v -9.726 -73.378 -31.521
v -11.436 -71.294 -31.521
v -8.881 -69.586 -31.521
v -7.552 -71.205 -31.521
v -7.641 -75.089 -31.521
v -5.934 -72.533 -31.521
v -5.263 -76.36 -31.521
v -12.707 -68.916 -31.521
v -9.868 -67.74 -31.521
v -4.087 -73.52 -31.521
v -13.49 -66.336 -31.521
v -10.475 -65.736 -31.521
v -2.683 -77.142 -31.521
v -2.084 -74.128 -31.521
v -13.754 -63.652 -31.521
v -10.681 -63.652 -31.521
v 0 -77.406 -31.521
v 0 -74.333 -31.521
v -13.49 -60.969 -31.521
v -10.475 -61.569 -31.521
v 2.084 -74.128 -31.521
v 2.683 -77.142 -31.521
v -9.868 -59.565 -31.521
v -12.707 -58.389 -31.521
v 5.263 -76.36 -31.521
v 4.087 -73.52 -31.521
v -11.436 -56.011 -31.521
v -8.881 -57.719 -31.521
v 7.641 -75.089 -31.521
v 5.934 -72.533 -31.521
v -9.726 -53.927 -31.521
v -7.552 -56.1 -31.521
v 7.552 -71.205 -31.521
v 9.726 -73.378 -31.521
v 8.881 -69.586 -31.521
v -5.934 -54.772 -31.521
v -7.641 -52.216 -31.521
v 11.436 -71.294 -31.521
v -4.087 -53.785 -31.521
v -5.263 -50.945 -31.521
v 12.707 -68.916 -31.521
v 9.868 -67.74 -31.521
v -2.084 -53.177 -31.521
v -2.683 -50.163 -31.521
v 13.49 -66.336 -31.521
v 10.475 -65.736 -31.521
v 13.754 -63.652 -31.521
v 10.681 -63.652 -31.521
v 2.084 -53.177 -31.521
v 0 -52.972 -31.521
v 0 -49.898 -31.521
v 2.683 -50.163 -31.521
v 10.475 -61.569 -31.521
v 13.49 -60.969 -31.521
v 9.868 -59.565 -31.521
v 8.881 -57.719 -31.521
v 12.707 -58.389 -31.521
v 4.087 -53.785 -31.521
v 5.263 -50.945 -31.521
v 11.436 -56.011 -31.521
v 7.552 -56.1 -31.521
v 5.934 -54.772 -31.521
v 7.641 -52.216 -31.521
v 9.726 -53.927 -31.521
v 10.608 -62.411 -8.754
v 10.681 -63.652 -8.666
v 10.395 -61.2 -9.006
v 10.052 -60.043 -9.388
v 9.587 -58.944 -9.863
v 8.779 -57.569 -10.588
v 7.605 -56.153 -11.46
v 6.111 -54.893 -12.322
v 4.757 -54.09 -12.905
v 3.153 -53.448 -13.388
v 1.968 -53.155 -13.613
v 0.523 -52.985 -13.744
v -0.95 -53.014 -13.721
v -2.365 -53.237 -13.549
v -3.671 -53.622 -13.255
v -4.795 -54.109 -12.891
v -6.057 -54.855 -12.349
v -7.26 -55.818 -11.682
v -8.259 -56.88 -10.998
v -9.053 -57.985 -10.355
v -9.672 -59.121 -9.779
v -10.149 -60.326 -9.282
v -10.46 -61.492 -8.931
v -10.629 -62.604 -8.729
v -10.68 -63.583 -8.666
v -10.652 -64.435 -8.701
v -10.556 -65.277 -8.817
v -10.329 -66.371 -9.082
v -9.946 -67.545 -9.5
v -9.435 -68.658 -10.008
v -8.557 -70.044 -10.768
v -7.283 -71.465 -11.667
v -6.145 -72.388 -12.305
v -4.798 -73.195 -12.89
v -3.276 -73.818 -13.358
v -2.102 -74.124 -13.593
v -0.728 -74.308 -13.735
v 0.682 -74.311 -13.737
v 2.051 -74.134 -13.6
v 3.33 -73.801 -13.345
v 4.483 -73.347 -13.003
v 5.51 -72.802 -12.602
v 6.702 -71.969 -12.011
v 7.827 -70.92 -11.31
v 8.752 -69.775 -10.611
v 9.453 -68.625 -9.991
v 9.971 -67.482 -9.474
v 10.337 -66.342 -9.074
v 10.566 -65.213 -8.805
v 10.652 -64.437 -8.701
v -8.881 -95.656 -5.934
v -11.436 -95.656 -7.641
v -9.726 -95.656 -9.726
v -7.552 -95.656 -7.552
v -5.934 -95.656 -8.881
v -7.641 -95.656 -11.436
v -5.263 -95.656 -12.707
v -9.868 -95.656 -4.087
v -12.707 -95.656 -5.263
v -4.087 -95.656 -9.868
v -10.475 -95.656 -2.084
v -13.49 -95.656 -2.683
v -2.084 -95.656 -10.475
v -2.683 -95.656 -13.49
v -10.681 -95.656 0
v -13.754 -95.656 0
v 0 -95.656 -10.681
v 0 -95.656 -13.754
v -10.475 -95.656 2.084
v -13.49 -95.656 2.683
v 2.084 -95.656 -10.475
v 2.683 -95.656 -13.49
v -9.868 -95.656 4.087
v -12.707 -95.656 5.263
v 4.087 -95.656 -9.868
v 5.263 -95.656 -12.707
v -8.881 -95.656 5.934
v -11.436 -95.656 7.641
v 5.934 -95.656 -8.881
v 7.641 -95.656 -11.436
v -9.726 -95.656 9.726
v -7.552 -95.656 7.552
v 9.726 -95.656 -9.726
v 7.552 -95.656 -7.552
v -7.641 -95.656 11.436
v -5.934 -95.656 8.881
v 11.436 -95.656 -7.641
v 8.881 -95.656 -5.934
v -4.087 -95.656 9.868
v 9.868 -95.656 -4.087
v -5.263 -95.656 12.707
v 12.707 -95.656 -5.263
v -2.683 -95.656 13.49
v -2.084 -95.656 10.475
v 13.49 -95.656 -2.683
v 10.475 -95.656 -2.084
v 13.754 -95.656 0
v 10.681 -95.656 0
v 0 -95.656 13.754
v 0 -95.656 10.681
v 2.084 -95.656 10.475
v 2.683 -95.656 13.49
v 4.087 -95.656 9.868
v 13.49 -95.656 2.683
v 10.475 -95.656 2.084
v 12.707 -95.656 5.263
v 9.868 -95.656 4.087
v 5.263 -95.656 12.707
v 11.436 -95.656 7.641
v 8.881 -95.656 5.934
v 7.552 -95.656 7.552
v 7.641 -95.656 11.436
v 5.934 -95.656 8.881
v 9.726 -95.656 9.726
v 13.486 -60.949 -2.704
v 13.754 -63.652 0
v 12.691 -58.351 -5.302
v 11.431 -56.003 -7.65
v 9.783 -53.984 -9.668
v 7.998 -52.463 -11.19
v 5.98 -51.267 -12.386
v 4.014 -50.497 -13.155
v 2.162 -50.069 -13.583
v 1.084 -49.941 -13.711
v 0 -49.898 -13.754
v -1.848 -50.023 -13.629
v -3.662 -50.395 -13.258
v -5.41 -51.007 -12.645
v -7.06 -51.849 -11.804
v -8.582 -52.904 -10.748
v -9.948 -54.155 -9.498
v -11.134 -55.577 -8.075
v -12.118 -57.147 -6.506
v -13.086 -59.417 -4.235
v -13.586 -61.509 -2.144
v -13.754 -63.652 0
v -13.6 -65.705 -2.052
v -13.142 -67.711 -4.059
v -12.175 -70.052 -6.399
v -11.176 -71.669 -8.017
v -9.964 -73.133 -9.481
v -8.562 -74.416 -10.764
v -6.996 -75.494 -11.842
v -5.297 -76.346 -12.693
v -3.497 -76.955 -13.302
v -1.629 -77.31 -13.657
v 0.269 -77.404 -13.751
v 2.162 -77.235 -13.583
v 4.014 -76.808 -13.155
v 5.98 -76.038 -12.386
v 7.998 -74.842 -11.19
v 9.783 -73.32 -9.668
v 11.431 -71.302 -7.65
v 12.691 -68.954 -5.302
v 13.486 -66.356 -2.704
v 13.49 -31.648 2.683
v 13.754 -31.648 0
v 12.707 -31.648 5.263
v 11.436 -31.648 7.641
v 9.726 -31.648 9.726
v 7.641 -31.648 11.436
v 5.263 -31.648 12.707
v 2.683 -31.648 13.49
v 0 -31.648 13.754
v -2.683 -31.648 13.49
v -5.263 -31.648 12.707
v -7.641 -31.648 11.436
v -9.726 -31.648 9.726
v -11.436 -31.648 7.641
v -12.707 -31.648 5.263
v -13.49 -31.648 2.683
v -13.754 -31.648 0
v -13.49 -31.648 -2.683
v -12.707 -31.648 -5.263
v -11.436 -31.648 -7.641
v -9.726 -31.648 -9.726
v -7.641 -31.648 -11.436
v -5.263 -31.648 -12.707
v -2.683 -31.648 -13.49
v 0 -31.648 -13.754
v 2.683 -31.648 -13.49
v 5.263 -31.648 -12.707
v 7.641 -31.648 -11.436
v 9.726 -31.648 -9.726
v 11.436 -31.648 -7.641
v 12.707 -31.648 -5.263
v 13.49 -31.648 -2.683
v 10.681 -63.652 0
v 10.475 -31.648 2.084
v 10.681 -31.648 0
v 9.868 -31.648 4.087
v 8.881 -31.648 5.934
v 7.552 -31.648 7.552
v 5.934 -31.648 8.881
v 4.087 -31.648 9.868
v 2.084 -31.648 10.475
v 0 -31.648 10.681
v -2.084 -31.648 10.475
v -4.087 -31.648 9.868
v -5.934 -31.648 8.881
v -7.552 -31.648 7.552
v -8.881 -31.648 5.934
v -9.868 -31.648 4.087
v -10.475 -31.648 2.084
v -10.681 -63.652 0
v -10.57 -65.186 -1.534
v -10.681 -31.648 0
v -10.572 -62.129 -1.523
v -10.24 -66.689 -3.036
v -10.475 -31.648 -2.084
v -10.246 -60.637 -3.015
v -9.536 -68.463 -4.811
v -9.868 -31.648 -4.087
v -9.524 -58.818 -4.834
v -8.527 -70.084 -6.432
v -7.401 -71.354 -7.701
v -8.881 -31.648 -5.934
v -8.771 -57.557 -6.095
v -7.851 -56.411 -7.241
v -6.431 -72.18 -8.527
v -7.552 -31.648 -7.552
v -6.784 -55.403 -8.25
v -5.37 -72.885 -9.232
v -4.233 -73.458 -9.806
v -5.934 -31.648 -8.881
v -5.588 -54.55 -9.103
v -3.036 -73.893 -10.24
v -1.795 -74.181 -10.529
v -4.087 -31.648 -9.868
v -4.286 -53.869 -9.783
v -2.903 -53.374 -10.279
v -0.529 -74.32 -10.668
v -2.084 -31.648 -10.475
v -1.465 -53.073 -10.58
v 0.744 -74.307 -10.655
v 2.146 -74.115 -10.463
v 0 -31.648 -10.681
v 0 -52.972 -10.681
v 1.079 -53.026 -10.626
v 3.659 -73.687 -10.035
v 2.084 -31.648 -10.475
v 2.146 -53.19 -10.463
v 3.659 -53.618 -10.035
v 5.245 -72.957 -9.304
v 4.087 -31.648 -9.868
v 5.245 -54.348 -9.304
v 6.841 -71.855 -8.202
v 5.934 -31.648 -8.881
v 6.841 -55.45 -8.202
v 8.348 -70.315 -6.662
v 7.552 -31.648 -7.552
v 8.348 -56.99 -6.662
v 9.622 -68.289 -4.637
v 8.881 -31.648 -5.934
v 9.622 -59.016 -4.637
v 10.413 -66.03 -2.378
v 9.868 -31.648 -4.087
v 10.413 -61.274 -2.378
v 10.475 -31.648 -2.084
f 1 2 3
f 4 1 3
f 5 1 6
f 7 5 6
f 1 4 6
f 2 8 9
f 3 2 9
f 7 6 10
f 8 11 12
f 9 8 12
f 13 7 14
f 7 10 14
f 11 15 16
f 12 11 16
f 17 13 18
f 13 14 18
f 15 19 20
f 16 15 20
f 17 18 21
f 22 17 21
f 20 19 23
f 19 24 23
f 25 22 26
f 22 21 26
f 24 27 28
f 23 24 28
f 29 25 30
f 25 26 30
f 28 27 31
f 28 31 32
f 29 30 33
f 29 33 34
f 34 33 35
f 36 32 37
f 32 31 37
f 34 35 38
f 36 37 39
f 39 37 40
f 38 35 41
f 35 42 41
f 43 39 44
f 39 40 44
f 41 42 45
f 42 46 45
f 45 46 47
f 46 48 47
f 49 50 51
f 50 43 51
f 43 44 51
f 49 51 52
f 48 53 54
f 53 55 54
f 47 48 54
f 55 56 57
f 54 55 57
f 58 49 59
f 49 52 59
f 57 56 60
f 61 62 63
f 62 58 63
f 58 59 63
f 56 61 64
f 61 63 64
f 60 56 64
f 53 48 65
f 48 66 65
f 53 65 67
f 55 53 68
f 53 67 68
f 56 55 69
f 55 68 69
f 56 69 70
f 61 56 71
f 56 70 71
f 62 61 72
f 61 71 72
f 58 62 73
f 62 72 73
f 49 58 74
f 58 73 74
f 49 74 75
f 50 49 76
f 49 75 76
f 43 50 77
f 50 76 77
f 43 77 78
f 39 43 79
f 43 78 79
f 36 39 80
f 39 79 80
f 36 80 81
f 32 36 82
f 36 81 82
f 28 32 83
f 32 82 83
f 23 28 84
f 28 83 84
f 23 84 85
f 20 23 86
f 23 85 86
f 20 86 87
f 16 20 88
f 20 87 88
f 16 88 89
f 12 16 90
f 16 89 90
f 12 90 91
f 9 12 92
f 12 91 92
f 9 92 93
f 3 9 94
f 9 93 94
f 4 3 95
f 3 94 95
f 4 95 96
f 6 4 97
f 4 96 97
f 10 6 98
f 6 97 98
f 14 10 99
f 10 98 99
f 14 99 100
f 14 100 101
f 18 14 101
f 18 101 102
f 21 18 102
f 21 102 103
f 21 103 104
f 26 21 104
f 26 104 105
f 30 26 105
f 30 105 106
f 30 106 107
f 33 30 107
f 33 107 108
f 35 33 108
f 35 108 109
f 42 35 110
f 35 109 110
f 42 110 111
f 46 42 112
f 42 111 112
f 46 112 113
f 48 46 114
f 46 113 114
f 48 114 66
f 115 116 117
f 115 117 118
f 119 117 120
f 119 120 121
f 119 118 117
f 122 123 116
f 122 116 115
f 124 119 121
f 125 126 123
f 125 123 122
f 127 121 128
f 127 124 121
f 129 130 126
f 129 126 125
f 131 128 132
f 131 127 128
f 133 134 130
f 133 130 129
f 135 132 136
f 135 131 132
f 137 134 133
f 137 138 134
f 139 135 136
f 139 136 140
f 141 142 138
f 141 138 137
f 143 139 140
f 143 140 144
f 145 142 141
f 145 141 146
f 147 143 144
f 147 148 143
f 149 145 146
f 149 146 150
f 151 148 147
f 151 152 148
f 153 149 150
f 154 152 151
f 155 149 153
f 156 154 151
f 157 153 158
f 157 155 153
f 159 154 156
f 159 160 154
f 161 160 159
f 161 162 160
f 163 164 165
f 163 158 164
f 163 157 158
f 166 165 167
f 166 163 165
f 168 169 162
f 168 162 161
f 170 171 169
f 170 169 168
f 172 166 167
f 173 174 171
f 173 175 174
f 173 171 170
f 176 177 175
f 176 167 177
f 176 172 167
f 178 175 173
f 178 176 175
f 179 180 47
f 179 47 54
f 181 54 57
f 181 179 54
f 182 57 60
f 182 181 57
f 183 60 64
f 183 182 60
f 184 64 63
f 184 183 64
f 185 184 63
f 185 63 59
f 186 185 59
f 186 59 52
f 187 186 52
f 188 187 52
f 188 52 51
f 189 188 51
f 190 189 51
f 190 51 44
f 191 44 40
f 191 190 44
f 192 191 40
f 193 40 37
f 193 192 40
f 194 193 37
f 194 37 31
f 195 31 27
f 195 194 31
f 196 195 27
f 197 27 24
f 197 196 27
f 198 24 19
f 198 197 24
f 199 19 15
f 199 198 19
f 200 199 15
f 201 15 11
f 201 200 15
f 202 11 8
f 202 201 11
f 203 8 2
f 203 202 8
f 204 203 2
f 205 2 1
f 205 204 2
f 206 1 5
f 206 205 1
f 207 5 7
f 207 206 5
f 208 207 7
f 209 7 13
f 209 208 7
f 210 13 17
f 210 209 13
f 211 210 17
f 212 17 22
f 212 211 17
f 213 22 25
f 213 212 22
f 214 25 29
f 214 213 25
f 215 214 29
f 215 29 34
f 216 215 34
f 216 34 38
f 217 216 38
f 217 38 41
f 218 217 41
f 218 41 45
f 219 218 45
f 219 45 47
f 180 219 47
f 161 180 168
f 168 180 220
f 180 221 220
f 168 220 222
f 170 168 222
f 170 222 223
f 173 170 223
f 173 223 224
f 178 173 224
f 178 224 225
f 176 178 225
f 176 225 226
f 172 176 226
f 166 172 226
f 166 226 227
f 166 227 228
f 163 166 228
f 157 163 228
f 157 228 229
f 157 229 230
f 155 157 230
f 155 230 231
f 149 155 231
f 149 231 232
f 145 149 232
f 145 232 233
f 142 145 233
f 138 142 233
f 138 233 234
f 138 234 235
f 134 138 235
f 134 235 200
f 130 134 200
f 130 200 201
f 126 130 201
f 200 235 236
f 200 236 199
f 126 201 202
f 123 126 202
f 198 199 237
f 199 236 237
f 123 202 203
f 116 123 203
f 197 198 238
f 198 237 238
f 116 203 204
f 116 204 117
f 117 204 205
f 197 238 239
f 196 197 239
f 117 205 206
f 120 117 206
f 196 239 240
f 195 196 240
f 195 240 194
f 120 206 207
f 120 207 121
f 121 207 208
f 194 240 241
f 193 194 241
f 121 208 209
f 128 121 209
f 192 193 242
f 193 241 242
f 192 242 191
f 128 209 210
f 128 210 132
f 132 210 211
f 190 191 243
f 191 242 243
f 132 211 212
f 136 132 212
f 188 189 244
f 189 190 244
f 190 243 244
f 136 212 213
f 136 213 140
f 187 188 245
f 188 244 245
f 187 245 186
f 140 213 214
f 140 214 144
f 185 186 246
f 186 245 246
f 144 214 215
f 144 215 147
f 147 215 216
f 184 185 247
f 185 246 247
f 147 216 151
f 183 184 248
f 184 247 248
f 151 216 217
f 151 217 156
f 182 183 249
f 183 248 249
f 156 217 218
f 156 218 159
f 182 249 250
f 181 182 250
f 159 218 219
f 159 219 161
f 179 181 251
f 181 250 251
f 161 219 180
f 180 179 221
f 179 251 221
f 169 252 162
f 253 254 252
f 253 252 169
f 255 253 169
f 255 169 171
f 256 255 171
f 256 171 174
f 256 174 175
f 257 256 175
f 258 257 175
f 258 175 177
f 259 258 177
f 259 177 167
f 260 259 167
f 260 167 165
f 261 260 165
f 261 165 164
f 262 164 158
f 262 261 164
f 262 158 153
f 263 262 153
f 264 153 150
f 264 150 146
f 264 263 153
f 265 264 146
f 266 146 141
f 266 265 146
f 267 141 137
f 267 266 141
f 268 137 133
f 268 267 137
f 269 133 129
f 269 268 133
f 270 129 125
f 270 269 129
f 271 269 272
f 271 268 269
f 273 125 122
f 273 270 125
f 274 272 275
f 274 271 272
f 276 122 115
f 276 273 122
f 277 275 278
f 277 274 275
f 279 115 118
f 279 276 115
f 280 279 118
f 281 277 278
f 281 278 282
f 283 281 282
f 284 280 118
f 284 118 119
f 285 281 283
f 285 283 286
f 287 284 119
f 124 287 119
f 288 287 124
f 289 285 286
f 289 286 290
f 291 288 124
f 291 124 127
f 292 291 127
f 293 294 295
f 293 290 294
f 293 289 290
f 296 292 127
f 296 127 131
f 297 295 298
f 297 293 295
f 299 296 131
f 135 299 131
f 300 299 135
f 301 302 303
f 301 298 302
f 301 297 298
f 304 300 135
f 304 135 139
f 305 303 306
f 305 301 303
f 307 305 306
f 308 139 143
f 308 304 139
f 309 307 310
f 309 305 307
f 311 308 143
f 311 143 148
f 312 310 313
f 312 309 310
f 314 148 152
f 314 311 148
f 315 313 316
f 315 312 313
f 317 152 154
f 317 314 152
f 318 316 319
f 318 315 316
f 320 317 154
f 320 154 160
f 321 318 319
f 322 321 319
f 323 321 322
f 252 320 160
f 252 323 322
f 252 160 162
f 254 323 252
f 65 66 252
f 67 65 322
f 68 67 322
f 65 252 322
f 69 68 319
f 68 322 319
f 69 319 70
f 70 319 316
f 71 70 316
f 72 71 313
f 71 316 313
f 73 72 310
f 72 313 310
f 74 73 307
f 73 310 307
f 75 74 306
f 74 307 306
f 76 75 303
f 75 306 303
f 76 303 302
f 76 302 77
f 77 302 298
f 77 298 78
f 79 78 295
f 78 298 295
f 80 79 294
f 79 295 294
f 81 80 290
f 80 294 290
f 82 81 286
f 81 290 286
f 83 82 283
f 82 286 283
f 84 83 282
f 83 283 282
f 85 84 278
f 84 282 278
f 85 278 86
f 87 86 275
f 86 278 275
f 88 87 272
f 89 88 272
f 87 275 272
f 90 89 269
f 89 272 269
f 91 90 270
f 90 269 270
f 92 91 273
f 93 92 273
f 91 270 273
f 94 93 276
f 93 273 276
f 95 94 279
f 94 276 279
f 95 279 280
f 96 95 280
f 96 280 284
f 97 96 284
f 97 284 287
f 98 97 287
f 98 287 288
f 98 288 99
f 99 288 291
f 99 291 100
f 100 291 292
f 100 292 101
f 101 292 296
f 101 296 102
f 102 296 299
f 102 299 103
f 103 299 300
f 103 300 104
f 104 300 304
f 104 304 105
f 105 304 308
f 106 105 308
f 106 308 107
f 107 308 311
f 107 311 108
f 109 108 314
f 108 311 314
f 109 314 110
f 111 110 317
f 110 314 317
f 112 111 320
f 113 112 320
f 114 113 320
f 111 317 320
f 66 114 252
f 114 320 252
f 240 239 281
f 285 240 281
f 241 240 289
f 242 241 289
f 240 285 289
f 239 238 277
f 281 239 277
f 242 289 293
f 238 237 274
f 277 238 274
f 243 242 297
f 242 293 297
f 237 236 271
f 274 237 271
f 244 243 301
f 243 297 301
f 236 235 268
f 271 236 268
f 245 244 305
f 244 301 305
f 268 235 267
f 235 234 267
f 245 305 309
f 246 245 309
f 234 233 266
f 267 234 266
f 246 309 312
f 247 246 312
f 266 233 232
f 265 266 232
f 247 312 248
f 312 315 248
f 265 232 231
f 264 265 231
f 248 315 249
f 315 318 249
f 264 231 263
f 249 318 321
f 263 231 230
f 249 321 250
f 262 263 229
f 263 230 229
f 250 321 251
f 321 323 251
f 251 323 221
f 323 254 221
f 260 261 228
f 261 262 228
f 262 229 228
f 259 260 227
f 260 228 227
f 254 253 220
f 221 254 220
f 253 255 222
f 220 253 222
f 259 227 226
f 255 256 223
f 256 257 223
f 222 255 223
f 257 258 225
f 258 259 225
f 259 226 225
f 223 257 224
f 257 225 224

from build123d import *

# Parameters (mm, degrees)
F1_R     = 13.7541
F1_R_2   = 10.6807
F2_DEPTH = 64.008
F3_R     = 13.7541
F3_R_2   = 10.6807
F4_DEPTH = 31.5214
F5_DEPTH = 64.009
F6_DEPTH = 25.4


with BuildPart() as f2:
    # F1 (on offset) → F2 (new body)
    with BuildSketch(Plane.XZ.offset(31.6484)):
        Circle(F1_R)
        Circle(F1_R_2, mode=Mode.SUBTRACT)
    extrude(amount=F2_DEPTH)

    # F3 (on Top) → F4 (join)
    with BuildSketch(Plane.XY):
        with Locations((0, -63.6524)):
            Circle(F3_R)
        with Locations((0, -63.6524)):
            Circle(F3_R_2, mode=Mode.SUBTRACT)
    extrude(amount=-F4_DEPTH)

    # F1 (on offset) → F5 (cut, through all)
    with BuildSketch(Plane.XZ.offset(31.6484)):
        Circle(F1_R_2)
    extrude(amount=F5_DEPTH, mode=Mode.SUBTRACT)

    # F3 (on Top) → F6 (cut)
    with BuildSketch(Plane.XY):
        with Locations((0, -63.6524)):
            Circle(F3_R_2)
    extrude(amount=-F6_DEPTH, mode=Mode.SUBTRACT)


solid = f2.part
